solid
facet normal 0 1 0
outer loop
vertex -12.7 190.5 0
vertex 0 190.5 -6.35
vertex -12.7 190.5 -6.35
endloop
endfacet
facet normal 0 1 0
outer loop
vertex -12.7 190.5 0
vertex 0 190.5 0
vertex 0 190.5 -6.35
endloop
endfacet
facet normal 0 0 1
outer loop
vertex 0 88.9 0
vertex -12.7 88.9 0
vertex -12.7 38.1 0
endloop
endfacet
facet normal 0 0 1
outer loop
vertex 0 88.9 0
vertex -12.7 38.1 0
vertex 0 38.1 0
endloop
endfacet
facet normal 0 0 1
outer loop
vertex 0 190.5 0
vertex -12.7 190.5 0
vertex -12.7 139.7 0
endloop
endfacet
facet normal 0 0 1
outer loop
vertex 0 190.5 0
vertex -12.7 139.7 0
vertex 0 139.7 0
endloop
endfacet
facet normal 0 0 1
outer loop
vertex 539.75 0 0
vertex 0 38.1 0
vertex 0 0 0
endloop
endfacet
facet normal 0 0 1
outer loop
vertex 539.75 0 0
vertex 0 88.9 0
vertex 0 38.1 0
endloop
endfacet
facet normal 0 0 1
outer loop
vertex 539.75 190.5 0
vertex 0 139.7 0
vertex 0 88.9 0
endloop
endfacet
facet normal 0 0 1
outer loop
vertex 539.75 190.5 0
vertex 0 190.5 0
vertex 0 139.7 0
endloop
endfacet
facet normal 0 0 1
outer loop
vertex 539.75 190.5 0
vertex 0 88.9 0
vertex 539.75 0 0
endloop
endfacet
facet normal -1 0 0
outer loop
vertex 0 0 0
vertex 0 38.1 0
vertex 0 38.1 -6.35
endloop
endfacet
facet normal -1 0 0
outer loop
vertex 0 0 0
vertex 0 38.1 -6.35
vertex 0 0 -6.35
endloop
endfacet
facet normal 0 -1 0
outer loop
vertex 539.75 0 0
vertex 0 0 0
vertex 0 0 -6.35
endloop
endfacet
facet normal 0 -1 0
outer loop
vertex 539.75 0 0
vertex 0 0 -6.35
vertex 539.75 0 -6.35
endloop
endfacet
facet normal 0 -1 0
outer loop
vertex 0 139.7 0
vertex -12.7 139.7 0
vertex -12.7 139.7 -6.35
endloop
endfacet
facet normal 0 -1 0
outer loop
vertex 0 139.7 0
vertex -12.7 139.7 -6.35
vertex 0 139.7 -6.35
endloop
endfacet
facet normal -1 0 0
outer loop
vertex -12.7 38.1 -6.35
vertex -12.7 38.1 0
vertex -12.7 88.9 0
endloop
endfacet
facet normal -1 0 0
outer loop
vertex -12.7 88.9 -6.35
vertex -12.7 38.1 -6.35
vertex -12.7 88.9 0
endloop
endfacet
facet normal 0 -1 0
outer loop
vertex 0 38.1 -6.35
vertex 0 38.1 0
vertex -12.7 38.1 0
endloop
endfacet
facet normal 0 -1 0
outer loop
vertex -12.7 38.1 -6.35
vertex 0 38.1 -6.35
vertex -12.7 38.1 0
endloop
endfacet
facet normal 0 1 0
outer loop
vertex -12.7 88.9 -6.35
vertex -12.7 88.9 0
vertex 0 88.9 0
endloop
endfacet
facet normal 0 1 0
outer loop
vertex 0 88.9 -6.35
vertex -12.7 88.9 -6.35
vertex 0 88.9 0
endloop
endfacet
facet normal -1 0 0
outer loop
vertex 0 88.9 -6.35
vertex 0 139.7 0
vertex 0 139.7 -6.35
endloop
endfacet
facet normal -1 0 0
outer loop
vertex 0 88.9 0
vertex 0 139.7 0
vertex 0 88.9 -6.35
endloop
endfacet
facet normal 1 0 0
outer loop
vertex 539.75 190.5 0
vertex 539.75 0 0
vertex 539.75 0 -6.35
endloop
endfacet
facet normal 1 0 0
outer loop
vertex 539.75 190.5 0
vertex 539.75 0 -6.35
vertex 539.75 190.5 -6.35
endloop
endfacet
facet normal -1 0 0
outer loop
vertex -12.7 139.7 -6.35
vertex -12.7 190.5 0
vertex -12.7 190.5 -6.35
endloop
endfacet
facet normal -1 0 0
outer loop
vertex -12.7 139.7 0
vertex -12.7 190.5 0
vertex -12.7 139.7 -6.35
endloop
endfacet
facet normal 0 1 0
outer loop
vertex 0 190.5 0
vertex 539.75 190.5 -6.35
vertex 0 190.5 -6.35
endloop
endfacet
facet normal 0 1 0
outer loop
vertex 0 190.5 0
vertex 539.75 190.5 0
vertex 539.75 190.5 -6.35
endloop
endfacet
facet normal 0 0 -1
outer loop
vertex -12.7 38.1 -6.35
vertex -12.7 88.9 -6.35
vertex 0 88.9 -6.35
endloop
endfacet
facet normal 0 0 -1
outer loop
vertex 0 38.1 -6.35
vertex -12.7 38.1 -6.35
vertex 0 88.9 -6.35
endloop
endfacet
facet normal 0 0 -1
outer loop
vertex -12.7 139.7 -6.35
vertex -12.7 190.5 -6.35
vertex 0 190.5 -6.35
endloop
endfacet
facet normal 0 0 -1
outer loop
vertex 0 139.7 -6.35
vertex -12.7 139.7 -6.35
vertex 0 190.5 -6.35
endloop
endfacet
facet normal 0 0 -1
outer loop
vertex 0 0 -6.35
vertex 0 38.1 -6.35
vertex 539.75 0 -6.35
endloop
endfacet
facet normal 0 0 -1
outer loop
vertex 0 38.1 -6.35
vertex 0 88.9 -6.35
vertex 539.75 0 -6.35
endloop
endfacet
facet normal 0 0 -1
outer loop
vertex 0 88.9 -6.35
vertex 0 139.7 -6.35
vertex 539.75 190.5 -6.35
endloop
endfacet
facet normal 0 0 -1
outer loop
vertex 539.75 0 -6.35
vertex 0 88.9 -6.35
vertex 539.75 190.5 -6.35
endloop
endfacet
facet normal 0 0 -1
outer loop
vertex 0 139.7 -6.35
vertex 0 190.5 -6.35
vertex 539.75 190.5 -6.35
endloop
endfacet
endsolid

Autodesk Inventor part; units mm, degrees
ref_plane "YZ Plane" through (0, 0, 0) normal (1, 0, 0) x (0, 1, 0)
ref_plane "XZ Plane" through (0, 0, 0) normal (0, 1, 0) x (-1, 0, 0)
ref_plane "XY Plane" through (0, 0, 0) normal (0, 0, 1) x (1, 0, 0)
sketch "Sketch1" plane through (0, 0, 0) normal (0, 0, 1) x (1, 0, 0)
  line L0 (0, 0) -> (539.75, 0)
  line L1 (539.75, 0) -> (539.75, 190.5)
  line L2 (539.75, 190.5) -> (0, 190.5)
  line L3 (0, 38.1) -> (-12.7, 38.1)
  line L4 (-12.7, 38.1) -> (-12.7, 88.9)
  line L5 (-12.7, 88.9) -> (0, 88.9)
  line L6 (0, 190.5) -> (-12.7, 190.5)
  line L7 (-12.7, 190.5) -> (-12.7, 139.7)
  line L8 (-12.7, 139.7) -> (0, 139.7)
  line L9 (0, 139.7) -> (0, 190.5) construction
  line L10 (0, 139.7) -> (0, 88.9)
  line L11 (0, 88.9) -> (0, 38.1) construction
  line L12 (0, 38.1) -> (0, 0)
  dimension "d0" = 190.5
  dimension "d1" = 539.75
  dimension "d10" = 12.7
  dimension "d11" = 50.8
  dimension "d12" = 50.8
  dimension "d13" = 50.8
extrude "Extrusion1" add sketch "Sketch1" against normal blind 6.35
properties part number "manipulator side pannel 2"
